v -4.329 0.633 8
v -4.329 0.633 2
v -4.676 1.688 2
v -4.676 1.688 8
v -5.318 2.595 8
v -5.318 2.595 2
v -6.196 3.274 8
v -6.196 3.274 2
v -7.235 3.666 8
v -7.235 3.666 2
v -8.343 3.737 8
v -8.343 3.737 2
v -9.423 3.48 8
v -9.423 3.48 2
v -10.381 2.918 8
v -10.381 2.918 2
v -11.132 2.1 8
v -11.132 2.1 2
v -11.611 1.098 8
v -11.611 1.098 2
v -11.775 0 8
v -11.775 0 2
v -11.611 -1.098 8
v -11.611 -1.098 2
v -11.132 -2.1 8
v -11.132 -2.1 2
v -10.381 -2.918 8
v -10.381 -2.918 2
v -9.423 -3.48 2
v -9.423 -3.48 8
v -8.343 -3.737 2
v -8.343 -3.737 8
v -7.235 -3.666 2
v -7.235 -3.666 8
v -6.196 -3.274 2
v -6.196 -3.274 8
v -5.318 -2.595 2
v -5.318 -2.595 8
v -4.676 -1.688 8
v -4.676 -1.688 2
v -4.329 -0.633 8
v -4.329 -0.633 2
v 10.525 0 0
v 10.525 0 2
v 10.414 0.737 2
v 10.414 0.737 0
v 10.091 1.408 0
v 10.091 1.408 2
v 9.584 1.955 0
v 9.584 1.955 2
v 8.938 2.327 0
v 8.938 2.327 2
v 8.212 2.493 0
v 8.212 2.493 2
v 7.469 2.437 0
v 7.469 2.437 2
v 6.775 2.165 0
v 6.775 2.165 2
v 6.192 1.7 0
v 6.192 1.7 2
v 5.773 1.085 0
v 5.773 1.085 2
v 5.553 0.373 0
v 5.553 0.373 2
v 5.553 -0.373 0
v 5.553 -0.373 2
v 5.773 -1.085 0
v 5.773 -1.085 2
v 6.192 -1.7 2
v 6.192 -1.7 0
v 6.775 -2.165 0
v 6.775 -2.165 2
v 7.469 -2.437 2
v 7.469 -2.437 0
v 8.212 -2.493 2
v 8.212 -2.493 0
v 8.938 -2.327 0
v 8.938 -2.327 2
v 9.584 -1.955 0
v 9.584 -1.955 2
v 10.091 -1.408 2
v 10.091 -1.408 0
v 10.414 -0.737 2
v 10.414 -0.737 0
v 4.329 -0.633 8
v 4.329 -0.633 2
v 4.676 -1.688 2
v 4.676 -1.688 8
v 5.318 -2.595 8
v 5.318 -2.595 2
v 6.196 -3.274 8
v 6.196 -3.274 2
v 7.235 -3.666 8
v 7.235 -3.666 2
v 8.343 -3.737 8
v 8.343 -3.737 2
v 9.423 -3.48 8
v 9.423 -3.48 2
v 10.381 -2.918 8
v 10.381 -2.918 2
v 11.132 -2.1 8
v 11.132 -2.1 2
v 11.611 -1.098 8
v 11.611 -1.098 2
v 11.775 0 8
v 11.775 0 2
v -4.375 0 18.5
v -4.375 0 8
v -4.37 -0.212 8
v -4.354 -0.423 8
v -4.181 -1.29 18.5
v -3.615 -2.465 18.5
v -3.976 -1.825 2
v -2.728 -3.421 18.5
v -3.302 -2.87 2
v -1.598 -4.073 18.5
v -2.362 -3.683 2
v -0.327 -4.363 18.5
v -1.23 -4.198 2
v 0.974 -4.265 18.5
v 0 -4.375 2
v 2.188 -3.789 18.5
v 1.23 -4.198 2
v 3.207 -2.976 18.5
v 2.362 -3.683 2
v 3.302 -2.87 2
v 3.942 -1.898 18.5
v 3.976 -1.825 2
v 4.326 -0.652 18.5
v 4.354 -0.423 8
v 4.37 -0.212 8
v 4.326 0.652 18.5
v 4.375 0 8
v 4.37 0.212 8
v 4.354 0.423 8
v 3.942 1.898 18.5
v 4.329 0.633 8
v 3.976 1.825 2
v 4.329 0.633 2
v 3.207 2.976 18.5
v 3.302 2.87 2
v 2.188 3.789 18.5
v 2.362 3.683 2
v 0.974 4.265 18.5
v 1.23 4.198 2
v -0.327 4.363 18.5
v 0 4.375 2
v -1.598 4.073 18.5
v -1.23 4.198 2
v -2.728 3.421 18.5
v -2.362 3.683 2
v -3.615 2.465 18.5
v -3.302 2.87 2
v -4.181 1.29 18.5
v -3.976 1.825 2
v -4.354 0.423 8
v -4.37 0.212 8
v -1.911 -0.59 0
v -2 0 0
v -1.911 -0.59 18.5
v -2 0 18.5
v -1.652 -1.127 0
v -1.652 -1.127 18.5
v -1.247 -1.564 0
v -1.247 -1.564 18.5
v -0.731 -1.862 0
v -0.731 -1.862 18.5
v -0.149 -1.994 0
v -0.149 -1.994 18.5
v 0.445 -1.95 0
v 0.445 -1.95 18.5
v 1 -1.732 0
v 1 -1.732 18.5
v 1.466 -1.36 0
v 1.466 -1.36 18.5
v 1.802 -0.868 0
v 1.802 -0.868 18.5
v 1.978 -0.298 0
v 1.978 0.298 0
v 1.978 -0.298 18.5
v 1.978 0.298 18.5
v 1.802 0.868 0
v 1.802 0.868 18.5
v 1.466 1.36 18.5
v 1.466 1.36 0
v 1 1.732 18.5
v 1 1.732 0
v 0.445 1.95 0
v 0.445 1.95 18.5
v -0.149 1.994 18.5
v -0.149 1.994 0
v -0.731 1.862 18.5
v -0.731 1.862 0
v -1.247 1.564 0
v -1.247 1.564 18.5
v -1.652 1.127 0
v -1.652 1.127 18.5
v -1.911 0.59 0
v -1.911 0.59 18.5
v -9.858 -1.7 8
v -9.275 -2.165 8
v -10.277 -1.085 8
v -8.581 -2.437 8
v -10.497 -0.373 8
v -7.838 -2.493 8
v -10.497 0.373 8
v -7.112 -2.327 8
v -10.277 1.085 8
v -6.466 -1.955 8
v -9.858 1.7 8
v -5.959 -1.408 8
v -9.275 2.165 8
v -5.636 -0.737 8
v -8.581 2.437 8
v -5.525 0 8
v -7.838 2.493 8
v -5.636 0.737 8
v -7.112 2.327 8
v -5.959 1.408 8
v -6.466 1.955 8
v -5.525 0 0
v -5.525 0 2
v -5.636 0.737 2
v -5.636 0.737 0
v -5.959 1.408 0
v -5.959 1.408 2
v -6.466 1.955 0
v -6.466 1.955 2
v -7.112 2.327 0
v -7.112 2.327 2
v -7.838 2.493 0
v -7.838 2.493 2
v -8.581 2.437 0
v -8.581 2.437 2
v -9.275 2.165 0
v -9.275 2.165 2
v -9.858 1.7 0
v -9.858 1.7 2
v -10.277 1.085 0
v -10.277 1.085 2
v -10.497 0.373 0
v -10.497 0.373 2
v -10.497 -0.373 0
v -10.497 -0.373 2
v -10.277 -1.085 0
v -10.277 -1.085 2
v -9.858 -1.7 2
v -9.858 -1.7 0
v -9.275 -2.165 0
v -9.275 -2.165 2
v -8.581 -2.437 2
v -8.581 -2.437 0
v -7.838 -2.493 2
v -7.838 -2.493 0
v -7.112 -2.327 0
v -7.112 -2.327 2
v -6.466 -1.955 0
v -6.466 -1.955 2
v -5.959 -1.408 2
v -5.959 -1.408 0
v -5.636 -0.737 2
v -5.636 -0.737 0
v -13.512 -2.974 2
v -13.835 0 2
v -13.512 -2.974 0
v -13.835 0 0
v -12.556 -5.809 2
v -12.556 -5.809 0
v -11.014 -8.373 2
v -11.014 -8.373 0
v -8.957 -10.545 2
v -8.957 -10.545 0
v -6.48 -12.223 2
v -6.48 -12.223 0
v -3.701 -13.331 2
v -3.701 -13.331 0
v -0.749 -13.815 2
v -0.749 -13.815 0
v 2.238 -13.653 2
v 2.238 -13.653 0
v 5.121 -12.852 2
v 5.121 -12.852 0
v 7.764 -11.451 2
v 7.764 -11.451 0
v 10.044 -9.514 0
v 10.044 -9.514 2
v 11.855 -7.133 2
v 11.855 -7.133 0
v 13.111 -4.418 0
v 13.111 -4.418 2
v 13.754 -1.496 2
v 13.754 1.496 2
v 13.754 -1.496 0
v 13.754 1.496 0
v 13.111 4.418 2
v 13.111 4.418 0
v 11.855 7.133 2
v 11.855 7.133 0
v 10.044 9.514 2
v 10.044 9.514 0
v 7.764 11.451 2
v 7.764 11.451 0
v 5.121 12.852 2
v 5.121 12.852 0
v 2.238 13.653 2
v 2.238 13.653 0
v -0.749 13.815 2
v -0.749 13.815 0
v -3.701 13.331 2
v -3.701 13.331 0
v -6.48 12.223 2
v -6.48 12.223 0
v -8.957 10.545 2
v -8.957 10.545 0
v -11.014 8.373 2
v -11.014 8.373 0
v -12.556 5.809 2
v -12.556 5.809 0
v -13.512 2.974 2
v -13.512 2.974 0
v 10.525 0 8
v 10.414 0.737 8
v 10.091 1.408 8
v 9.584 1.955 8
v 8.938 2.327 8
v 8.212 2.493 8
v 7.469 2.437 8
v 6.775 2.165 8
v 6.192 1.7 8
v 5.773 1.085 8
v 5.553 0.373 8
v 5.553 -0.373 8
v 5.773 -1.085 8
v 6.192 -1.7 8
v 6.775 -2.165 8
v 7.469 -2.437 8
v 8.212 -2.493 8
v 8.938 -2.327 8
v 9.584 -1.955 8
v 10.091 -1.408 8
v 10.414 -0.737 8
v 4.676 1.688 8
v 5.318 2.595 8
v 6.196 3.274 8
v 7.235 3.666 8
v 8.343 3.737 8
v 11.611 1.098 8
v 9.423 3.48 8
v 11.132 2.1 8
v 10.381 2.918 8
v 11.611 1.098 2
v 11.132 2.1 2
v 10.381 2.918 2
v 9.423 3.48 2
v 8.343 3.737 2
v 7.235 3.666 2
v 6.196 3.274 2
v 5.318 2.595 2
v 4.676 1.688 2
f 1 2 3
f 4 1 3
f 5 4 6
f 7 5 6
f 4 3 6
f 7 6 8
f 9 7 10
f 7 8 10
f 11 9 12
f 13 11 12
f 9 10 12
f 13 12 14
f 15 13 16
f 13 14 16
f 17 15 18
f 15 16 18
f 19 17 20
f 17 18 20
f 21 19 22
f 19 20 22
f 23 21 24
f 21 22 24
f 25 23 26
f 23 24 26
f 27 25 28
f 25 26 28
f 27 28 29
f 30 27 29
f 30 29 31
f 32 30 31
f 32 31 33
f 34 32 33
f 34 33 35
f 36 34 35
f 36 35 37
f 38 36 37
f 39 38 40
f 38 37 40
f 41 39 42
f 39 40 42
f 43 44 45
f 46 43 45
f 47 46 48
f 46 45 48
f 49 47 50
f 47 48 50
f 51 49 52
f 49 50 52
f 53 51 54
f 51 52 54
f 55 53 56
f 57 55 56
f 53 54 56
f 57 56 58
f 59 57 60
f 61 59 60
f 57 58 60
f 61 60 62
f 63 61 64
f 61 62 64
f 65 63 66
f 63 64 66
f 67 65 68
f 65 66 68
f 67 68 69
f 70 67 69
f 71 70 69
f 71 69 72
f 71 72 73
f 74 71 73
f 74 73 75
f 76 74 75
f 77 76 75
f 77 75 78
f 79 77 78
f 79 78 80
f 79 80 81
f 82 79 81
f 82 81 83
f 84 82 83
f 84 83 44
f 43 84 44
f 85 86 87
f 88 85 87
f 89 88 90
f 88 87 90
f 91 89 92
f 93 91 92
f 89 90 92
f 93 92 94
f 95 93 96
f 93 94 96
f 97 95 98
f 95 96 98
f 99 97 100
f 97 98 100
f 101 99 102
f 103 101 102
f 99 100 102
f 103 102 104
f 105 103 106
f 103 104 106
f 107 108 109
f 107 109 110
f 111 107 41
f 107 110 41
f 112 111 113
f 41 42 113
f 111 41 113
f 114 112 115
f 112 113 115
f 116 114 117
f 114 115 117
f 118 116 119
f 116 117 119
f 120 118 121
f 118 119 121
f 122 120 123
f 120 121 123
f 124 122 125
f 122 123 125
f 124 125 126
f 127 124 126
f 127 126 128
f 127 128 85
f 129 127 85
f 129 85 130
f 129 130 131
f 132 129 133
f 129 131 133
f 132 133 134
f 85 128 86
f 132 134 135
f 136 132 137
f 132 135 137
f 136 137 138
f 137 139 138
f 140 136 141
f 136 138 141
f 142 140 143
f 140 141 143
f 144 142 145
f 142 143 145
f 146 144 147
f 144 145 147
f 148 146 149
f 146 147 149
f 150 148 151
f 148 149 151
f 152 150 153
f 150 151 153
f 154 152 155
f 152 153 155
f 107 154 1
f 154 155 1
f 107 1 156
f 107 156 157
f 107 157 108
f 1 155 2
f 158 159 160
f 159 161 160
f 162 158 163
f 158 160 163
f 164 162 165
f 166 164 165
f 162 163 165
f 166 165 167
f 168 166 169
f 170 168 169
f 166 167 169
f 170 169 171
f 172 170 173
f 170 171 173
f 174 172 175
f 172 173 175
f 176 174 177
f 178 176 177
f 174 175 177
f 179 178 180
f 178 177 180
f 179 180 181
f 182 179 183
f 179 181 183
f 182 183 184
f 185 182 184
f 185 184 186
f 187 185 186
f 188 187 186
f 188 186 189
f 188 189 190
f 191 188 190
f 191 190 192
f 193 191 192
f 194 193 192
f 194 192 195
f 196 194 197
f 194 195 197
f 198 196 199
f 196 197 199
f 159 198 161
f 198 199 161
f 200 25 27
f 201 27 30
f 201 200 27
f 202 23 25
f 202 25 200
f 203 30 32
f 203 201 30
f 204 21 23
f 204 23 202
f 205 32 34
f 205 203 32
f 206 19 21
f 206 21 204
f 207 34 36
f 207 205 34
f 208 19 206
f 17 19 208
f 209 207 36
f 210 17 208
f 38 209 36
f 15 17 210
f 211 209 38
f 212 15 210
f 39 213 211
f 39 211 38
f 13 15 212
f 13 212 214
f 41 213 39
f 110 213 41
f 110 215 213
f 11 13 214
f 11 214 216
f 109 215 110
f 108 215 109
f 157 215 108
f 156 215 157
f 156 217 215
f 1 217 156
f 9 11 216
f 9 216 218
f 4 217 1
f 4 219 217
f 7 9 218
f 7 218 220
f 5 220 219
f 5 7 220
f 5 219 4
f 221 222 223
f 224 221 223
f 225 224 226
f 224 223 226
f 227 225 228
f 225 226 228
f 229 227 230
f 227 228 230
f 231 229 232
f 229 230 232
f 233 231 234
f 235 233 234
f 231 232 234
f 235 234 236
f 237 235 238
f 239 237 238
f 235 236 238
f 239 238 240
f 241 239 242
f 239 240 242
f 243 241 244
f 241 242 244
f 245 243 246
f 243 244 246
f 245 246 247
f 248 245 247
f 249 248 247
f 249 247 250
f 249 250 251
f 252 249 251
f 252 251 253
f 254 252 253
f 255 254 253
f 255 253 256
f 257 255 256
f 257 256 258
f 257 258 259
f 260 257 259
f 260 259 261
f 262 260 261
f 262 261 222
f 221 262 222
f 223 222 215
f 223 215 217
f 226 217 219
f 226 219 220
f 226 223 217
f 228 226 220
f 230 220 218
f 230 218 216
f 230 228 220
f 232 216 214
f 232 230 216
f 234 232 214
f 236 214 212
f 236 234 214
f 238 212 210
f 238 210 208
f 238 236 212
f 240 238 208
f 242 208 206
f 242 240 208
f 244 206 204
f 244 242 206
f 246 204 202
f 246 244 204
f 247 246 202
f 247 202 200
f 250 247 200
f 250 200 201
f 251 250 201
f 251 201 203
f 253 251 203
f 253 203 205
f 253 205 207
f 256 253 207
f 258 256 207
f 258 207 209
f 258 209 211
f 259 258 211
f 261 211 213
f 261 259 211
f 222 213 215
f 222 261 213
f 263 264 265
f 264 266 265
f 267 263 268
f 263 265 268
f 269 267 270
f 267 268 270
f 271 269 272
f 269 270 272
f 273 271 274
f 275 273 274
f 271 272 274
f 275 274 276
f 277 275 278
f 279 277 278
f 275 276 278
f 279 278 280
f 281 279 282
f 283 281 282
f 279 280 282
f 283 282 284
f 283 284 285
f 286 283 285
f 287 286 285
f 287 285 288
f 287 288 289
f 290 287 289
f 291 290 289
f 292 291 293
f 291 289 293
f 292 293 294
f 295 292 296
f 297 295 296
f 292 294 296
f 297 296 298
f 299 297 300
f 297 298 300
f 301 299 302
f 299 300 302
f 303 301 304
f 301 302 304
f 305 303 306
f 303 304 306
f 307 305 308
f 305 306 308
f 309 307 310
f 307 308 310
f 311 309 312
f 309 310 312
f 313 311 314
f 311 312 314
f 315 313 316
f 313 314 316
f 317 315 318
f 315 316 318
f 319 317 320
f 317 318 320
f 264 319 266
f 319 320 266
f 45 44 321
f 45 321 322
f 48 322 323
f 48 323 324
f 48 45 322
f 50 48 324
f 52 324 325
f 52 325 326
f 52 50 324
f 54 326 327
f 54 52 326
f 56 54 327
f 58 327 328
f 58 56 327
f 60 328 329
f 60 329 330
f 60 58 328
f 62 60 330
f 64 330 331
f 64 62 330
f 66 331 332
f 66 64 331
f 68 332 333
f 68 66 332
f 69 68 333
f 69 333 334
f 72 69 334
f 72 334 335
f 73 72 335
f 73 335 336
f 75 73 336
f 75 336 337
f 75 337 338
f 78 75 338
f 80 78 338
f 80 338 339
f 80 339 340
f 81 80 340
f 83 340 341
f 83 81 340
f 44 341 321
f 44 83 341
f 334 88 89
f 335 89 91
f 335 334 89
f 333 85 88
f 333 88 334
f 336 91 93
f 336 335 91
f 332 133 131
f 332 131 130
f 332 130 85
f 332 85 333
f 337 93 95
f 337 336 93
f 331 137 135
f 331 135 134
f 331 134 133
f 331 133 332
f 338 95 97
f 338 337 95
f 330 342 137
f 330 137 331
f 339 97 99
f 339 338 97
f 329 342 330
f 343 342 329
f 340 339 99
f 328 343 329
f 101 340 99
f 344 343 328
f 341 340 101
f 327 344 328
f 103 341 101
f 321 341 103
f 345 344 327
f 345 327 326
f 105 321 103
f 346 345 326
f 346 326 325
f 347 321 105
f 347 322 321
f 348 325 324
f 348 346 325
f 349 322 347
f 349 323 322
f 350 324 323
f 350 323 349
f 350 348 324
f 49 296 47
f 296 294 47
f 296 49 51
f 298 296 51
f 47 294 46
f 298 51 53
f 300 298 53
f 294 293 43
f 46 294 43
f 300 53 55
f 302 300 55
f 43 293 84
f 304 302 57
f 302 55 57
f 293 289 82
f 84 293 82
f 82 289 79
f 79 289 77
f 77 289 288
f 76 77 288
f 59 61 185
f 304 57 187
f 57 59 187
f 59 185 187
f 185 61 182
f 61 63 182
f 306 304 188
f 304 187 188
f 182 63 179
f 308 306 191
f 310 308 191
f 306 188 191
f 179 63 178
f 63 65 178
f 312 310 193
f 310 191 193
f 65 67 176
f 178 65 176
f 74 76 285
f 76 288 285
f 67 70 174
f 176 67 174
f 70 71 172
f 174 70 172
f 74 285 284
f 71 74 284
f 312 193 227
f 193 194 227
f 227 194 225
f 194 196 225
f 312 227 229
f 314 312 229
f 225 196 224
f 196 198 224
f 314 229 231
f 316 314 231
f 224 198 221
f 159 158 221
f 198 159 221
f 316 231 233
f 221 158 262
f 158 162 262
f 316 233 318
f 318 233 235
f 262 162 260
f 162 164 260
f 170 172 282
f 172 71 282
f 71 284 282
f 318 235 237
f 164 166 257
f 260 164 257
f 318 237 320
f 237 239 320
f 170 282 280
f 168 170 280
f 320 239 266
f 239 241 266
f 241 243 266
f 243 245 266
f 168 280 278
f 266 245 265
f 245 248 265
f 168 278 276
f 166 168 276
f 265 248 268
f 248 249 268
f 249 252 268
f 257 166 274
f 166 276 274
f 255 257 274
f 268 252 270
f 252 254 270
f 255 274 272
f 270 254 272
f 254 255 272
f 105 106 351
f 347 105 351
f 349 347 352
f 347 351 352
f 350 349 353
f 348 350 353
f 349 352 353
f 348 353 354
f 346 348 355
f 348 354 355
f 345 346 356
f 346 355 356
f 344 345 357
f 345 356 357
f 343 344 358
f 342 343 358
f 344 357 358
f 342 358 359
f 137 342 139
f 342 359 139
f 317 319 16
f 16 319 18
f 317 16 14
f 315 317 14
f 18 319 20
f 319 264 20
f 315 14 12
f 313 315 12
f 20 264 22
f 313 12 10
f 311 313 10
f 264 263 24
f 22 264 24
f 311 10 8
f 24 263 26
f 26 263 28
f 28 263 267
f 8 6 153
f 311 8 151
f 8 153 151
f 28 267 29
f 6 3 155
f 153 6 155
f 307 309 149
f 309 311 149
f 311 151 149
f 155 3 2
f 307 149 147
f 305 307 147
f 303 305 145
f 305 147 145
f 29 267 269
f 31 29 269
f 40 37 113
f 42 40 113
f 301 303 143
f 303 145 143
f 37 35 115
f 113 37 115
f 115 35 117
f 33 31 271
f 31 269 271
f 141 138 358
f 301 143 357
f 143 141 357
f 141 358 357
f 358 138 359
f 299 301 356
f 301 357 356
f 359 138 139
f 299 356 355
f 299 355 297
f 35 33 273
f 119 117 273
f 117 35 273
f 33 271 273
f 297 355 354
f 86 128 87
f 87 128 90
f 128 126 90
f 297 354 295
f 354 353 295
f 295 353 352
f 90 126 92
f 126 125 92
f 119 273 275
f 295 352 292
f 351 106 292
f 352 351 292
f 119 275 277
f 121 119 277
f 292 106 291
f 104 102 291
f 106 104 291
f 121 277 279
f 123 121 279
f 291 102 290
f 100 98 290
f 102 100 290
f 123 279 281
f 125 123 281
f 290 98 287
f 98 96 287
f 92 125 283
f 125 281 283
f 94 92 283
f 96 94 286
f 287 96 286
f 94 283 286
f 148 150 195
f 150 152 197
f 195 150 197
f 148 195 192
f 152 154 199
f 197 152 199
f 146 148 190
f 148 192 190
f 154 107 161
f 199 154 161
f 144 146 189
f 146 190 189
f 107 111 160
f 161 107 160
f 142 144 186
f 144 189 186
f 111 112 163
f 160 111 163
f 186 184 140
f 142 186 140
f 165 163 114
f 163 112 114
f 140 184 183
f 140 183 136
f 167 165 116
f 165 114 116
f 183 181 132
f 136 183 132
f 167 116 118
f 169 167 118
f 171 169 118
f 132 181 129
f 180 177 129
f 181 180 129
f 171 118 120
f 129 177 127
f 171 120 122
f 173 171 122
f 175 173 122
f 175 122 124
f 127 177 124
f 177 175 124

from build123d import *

# Parameters (mm, degrees)
F2_R     = 2.5
F3_DEPTH = 6
F4_DEPTH = 25


with BuildPart() as f1:
    # F0 (on Front) → F1 (revolve)
    with BuildSketch(Plane.XZ):
        Polygon((-4.375, 0), (-2, 0), (-2, 18.5), (-4.375, 18.5), (-4.375, 2), (-13.835, 2), (-13.835, 0), align=None)
    revolve(axis=Axis((0, 0, 9.25), (0, 0, 1)))

    # F2 (on face) → F3 (join)
    with BuildSketch(Plane.XY.offset(2)):
        with BuildLine():
            ThreePointArc((-4.328894081, -0.6334832559), (-4.375, 0), (-4.328894081, 0.6334832559))
            ThreePointArc((-4.328894081, 0.6334832559), (-11.775, 0), (-4.328894081, -0.6334832559))
        make_face()
        with Locations((-8.025, 0)):
            Circle(F2_R, mode=Mode.SUBTRACT)
        with BuildLine():
            ThreePointArc((11.775, 0), (8.3428858315, 3.7365021876), (4.328894081, 0.6334832559))
            ThreePointArc((4.328894081, 0.6334832559), (4.3634582961, 0.3175794354), (4.375, 0))
            ThreePointArc((4.375, 0), (4.3634582961, -0.3175794354), (4.328894081, -0.6334832559))
            ThreePointArc((4.328894081, -0.6334832559), (8.3428858315, -3.7365021876), (11.775, 0))
        make_face()
        with Locations((8.025, 0)):
            Circle(F2_R, mode=Mode.SUBTRACT)
    extrude(amount=F3_DEPTH)

    # F4 (cut): faces of the model
    f4_faces = [f1.faces().sort_by_distance(p)[0] for p in [
        (-8.025, 0, 2),
        (8.025, 0, 2),
    ]]
    extrude(f4_faces, amount=-F4_DEPTH, mode=Mode.SUBTRACT)


solid = f1.part
